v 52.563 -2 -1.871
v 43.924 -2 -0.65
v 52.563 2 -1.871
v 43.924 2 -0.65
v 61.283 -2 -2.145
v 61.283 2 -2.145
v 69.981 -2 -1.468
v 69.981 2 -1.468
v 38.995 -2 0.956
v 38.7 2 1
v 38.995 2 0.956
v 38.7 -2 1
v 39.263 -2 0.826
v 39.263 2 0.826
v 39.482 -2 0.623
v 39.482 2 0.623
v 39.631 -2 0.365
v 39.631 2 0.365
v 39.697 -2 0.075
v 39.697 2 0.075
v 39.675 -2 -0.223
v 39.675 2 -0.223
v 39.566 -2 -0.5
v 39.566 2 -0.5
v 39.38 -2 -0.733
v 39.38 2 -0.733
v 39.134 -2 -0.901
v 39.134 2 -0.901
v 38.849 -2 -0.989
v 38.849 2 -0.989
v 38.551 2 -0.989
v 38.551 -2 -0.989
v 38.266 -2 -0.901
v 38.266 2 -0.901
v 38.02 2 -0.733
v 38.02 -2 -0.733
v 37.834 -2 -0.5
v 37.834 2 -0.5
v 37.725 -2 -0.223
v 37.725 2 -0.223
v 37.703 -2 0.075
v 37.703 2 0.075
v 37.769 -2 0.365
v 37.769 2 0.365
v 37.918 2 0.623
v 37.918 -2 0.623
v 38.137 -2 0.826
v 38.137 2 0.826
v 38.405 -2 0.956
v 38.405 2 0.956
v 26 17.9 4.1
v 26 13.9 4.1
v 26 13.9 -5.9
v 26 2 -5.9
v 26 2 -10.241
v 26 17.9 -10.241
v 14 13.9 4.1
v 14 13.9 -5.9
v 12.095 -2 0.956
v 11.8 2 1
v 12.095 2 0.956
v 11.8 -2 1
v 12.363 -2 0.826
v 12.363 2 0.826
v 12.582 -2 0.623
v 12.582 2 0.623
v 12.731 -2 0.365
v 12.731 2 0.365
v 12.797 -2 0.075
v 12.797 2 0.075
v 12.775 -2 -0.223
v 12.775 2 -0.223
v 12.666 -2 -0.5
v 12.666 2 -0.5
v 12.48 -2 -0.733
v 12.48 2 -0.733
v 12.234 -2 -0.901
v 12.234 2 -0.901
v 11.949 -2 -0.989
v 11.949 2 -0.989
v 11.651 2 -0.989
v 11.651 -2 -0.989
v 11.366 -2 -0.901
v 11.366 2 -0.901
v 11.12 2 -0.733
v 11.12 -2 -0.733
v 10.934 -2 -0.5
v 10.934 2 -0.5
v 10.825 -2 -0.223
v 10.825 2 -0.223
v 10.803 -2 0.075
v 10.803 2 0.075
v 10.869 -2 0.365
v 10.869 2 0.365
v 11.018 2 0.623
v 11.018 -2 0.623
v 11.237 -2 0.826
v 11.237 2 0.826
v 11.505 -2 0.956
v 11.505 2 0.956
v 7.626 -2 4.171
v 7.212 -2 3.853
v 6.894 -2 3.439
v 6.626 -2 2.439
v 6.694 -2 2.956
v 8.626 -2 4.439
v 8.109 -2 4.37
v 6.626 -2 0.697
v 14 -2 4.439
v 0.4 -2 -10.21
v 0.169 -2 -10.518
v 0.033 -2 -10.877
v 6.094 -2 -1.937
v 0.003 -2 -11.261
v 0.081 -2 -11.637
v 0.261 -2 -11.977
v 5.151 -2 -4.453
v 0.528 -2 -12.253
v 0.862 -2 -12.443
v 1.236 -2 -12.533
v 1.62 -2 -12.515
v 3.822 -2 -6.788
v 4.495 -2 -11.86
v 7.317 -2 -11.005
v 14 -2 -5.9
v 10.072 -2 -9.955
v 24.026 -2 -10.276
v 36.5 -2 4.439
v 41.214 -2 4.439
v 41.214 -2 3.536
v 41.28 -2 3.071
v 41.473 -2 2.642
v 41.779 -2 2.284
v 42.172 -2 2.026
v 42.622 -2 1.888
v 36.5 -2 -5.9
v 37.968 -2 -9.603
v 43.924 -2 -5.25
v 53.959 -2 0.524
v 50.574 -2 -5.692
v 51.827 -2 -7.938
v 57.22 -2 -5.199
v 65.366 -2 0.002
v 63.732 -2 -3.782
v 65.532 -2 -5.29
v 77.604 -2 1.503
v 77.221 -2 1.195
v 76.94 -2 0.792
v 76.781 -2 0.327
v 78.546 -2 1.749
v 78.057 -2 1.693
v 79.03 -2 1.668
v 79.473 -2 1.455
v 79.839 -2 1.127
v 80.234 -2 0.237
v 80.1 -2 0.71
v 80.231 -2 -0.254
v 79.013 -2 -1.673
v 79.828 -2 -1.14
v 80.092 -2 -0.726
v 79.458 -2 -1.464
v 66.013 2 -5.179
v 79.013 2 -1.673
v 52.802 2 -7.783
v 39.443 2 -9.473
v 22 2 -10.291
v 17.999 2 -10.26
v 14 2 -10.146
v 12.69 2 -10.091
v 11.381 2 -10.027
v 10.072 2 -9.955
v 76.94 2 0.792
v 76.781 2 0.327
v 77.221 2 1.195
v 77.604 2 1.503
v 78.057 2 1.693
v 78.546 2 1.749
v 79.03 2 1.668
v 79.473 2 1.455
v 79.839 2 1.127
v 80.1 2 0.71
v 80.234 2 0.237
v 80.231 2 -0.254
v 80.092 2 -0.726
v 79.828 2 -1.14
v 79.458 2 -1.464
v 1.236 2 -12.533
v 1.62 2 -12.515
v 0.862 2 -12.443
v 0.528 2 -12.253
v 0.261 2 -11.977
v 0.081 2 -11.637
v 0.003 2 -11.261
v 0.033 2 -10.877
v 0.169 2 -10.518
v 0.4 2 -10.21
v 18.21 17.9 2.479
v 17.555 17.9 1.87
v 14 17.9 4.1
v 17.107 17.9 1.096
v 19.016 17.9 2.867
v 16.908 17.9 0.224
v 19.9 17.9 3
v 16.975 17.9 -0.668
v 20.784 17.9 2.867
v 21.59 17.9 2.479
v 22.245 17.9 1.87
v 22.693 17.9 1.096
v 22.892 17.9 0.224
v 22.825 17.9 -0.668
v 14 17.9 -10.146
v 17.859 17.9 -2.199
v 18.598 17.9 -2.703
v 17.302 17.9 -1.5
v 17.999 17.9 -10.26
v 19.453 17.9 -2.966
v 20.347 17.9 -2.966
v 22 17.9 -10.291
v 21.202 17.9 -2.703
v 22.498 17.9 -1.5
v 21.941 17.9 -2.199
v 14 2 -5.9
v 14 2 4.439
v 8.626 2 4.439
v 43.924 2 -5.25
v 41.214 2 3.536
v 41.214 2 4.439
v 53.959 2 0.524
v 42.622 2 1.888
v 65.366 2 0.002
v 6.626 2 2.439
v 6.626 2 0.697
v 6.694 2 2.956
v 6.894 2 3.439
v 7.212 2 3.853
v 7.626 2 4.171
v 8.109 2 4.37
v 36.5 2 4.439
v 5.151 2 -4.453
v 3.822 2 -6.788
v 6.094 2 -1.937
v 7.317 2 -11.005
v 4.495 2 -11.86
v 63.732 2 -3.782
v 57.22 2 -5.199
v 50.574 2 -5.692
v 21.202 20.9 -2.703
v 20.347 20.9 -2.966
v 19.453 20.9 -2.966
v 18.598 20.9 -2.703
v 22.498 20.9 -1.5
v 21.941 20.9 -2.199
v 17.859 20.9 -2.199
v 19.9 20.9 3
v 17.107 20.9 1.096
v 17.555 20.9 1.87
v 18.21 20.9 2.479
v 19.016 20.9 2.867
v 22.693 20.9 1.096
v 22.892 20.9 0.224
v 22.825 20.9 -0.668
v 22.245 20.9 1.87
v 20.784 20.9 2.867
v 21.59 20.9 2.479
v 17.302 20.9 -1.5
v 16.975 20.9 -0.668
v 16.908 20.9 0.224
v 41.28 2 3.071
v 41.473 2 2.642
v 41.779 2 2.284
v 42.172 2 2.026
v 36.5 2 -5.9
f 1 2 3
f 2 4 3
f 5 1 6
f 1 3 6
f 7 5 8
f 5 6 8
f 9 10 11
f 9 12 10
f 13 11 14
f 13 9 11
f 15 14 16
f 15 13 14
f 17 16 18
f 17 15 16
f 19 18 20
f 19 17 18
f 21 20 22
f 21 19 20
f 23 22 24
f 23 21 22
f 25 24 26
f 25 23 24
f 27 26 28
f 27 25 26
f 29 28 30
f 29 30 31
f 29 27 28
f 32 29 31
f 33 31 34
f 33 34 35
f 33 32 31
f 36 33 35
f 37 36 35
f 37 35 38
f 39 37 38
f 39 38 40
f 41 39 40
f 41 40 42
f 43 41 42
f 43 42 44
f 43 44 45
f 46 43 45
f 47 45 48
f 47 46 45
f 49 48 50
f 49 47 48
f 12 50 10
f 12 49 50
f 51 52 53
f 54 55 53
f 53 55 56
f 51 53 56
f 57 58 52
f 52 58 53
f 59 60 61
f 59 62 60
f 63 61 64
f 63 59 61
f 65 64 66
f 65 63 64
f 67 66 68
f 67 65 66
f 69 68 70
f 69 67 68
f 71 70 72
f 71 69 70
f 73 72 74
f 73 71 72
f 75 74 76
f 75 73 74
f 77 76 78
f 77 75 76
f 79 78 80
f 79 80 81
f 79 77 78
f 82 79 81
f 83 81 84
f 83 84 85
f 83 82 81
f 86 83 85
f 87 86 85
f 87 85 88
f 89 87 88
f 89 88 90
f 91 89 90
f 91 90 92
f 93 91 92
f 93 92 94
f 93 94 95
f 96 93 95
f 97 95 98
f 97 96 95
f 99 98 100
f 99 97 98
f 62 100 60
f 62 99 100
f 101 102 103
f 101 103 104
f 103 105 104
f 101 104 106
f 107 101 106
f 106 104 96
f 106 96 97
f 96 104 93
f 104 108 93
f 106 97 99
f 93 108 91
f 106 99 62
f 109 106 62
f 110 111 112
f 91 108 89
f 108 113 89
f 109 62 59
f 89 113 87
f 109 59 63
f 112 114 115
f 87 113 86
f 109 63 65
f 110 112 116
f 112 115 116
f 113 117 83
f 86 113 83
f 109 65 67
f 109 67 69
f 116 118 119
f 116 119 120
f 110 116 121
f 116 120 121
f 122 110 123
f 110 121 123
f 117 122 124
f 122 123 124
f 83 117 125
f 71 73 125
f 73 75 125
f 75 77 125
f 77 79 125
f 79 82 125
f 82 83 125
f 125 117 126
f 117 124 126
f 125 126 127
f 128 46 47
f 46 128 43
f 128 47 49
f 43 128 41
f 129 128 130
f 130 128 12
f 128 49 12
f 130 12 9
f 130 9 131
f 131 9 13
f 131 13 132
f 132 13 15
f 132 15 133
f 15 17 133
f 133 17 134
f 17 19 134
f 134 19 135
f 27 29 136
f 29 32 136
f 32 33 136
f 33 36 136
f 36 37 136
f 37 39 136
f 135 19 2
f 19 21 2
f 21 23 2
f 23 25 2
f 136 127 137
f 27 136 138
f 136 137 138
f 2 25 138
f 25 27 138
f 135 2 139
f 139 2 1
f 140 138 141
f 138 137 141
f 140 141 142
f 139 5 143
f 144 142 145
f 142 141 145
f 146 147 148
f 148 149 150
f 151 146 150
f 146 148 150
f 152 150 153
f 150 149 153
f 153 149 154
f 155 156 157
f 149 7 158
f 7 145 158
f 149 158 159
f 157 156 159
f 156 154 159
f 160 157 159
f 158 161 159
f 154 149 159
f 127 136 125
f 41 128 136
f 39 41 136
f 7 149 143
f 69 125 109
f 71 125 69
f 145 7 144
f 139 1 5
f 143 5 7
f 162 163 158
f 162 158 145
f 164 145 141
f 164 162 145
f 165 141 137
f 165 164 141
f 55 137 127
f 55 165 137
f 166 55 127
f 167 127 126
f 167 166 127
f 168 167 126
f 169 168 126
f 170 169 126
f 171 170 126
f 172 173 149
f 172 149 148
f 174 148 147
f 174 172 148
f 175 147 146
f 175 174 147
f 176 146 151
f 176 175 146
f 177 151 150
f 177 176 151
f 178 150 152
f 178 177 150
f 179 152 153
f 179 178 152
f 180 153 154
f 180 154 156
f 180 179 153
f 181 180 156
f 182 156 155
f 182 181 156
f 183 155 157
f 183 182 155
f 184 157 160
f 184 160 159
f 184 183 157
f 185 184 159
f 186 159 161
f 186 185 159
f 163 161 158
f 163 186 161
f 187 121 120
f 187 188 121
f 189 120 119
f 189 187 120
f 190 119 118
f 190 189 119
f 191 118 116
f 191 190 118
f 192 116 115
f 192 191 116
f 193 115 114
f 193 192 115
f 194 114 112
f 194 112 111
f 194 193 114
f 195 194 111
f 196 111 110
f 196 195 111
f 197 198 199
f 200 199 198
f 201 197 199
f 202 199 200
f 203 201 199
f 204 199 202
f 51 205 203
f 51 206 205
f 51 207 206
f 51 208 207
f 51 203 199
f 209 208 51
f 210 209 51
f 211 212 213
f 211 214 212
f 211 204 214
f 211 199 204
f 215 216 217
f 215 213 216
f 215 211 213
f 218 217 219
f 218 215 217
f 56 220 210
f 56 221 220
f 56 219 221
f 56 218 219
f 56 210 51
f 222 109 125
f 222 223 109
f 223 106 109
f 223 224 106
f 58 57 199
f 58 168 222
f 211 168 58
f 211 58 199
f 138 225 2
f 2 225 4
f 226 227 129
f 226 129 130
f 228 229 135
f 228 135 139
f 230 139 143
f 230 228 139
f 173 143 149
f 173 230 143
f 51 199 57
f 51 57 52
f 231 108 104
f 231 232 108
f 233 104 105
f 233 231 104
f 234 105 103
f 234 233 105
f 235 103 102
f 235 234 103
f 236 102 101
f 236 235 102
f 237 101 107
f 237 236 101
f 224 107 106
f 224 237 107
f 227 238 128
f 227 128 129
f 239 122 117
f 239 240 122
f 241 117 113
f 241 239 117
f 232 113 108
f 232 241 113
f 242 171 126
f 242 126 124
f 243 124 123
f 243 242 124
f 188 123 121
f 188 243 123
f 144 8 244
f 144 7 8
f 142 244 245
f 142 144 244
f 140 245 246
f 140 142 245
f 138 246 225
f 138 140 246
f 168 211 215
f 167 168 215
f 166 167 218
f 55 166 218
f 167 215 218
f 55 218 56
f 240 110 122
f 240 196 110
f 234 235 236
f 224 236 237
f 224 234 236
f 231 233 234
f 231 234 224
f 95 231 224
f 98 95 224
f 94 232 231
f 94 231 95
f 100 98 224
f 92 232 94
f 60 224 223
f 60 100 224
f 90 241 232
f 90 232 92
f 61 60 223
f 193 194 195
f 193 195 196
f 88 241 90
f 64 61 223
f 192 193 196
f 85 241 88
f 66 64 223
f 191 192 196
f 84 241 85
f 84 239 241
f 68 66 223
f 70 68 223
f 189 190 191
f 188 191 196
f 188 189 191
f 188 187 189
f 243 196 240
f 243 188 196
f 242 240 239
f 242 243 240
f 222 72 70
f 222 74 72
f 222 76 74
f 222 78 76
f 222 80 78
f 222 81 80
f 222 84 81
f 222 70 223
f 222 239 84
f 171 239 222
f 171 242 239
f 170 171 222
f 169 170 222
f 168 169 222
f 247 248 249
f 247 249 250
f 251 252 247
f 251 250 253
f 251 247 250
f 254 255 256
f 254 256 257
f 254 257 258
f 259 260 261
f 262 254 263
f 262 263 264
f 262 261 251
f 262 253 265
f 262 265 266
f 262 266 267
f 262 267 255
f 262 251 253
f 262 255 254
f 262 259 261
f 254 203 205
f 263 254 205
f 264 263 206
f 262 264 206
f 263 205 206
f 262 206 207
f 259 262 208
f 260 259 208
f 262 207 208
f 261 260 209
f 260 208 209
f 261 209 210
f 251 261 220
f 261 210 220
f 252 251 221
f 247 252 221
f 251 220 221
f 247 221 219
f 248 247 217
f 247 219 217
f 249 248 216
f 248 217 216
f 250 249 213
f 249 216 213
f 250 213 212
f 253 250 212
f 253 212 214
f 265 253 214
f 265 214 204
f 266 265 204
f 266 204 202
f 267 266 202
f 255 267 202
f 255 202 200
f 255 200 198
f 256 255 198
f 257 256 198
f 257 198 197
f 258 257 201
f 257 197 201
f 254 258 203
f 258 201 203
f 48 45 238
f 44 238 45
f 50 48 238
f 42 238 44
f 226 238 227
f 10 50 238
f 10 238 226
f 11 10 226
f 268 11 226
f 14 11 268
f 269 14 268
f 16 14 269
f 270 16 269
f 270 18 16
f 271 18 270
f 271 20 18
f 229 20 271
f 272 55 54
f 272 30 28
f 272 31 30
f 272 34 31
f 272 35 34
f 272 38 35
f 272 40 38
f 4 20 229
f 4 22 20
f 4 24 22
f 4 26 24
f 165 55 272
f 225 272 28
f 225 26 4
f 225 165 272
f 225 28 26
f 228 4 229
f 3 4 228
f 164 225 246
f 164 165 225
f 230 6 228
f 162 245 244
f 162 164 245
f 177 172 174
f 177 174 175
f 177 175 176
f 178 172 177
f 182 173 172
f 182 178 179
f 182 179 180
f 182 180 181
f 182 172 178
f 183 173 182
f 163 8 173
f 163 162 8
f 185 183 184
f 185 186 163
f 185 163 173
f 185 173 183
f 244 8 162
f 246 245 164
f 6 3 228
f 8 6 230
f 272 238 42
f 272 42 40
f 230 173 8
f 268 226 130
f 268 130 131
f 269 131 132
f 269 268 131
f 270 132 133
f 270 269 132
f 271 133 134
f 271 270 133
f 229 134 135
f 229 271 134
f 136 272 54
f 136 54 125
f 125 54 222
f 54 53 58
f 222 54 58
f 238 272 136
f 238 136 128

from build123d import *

# Parameters (mm, degrees)
SKETCH1_R           = 1
BOSS_EXTRUDE1_DEPTH = 2
BOSS_EXTRUDE2_START = 15.9
BOSS_EXTRUDE2_DEPTH = 15.9
SKETCH3_W           = 12
SKETCH3_H           = 4
BOSS_EXTRUDE3_DEPTH = 10
SKETCH5_R           = 3
BOSS_EXTRUDE4_DEPTH = 3


with BuildPart() as part:
    # Sketch1 → Boss-Extrude1 (new, symmetric)
    with BuildSketch(Plane(origin=(0, 0, 0), x_dir=(1, 0, 0), z_dir=(0, 1, 0))):
        with BuildLine():
            Line((14, 0), (14, 5.9))
            Line((14, 5.9), (36.5, 5.9))
            Line((36.5, 5.9), (36.5, 0))
            Line((36.5, 0), (36.5, -4.438518159))
            Line((36.5, -4.438518159), (41.213519663, -4.438518159))
            Line((41.213519663, -4.438518159), (41.213519663, -3.536214297))
            ThreePointArc((41.213519663, -3.536214297), (41.613535265, -2.452170394), (42.621822841, -1.887794784))
            ThreePointArc((42.621822841, -1.887794784), (59.657919167, -0.157445784), (76.780825793, -0.327016892))
            ThreePointArc((76.780825793, -0.327016892), (79.667666349, -1.303478154), (79.013446705, 1.672983108))
            ThreePointArc((79.013446705, 1.672983108), (44.912555428, 8.893863941), (10.071688353, 9.954942307))
            ThreePointArc((10.071688353, 9.954942307), (5.913323938, 11.457100516), (1.620293164, 12.514626243))
            ThreePointArc((1.620293164, 12.514626243), (0.158700912, 11.813412309), (0.399525234, 10.21030391))
            Line((0.399525234, 10.21030391), (3.821916897, 6.787912247))
            ThreePointArc((3.821916897, 6.787912247), (5.672488258, 3.21348854), (6.62634024, -0.696918803))
            Line((6.62634024, -0.696918803), (6.62634024, -2.438518159))
            ThreePointArc((6.62634024, -2.438518159), (7.212126678, -3.852731721), (8.62634024, -4.438518159))
            Line((8.62634024, -4.438518159), (14, -4.438518159))
            Line((14, -4.438518159), (14, 0))
        make_face()
        with Locations(Location((11.8, 0, 0), (0, 0, 270))):
            Circle(SKETCH1_R, mode=Mode.SUBTRACT)
        with Locations(Location((38.7, 0, 0), (0, 0, 270))):
            Circle(SKETCH1_R, mode=Mode.SUBTRACT)
        with BuildLine():
            Line((43.924254337, 5.25), (43.924254337, 0.65))
            ThreePointArc((43.924254337, 0.65), (56.919306874, 2.126797691), (69.981420933, 1.468391921))
            ThreePointArc((69.981420933, 1.468391921), (57.21989374, 5.199345781), (43.924254337, 5.25))
        make_face(mode=Mode.SUBTRACT)
    extrude(amount=BOSS_EXTRUDE1_DEPTH, both=True)

    # Sketch2 → Boss-Extrude2 (add)
    with BuildSketch(Plane(origin=(0, 2, 0), x_dir=(1, 0, 0), z_dir=(0, 1, 0)).offset(BOSS_EXTRUDE2_START)):
        with BuildLine():
            Line((14, 5.9), (14, 10.146104419))
            ThreePointArc((14, 10.146104419), (19.999270016, 10.285681215), (26, 10.241385974))
            Line((26, 10.241385974), (26, 5.9))
            Line((26, 5.9), (14, 5.9))
        make_face()
    extrude(amount=-BOSS_EXTRUDE2_DEPTH)

    # Sketch3 → Boss-Extrude3 (add)
    with BuildSketch(Plane.XY.offset(-5.9)):
        with Locations((20, 15.9)):
            Rectangle(SKETCH3_W, SKETCH3_H)
    extrude(amount=BOSS_EXTRUDE3_DEPTH)

    # Sketch5 → Boss-Extrude4 (add)
    with BuildSketch(Plane(origin=(0, 17.9, 0), x_dir=(1, 0, 0), z_dir=(0, 1, 0))):
        with Locations(Location((19.9, 0, 0), (0, 0, 270))):
            Circle(SKETCH5_R)
    extrude(amount=BOSS_EXTRUDE4_DEPTH)


solid = part.part
